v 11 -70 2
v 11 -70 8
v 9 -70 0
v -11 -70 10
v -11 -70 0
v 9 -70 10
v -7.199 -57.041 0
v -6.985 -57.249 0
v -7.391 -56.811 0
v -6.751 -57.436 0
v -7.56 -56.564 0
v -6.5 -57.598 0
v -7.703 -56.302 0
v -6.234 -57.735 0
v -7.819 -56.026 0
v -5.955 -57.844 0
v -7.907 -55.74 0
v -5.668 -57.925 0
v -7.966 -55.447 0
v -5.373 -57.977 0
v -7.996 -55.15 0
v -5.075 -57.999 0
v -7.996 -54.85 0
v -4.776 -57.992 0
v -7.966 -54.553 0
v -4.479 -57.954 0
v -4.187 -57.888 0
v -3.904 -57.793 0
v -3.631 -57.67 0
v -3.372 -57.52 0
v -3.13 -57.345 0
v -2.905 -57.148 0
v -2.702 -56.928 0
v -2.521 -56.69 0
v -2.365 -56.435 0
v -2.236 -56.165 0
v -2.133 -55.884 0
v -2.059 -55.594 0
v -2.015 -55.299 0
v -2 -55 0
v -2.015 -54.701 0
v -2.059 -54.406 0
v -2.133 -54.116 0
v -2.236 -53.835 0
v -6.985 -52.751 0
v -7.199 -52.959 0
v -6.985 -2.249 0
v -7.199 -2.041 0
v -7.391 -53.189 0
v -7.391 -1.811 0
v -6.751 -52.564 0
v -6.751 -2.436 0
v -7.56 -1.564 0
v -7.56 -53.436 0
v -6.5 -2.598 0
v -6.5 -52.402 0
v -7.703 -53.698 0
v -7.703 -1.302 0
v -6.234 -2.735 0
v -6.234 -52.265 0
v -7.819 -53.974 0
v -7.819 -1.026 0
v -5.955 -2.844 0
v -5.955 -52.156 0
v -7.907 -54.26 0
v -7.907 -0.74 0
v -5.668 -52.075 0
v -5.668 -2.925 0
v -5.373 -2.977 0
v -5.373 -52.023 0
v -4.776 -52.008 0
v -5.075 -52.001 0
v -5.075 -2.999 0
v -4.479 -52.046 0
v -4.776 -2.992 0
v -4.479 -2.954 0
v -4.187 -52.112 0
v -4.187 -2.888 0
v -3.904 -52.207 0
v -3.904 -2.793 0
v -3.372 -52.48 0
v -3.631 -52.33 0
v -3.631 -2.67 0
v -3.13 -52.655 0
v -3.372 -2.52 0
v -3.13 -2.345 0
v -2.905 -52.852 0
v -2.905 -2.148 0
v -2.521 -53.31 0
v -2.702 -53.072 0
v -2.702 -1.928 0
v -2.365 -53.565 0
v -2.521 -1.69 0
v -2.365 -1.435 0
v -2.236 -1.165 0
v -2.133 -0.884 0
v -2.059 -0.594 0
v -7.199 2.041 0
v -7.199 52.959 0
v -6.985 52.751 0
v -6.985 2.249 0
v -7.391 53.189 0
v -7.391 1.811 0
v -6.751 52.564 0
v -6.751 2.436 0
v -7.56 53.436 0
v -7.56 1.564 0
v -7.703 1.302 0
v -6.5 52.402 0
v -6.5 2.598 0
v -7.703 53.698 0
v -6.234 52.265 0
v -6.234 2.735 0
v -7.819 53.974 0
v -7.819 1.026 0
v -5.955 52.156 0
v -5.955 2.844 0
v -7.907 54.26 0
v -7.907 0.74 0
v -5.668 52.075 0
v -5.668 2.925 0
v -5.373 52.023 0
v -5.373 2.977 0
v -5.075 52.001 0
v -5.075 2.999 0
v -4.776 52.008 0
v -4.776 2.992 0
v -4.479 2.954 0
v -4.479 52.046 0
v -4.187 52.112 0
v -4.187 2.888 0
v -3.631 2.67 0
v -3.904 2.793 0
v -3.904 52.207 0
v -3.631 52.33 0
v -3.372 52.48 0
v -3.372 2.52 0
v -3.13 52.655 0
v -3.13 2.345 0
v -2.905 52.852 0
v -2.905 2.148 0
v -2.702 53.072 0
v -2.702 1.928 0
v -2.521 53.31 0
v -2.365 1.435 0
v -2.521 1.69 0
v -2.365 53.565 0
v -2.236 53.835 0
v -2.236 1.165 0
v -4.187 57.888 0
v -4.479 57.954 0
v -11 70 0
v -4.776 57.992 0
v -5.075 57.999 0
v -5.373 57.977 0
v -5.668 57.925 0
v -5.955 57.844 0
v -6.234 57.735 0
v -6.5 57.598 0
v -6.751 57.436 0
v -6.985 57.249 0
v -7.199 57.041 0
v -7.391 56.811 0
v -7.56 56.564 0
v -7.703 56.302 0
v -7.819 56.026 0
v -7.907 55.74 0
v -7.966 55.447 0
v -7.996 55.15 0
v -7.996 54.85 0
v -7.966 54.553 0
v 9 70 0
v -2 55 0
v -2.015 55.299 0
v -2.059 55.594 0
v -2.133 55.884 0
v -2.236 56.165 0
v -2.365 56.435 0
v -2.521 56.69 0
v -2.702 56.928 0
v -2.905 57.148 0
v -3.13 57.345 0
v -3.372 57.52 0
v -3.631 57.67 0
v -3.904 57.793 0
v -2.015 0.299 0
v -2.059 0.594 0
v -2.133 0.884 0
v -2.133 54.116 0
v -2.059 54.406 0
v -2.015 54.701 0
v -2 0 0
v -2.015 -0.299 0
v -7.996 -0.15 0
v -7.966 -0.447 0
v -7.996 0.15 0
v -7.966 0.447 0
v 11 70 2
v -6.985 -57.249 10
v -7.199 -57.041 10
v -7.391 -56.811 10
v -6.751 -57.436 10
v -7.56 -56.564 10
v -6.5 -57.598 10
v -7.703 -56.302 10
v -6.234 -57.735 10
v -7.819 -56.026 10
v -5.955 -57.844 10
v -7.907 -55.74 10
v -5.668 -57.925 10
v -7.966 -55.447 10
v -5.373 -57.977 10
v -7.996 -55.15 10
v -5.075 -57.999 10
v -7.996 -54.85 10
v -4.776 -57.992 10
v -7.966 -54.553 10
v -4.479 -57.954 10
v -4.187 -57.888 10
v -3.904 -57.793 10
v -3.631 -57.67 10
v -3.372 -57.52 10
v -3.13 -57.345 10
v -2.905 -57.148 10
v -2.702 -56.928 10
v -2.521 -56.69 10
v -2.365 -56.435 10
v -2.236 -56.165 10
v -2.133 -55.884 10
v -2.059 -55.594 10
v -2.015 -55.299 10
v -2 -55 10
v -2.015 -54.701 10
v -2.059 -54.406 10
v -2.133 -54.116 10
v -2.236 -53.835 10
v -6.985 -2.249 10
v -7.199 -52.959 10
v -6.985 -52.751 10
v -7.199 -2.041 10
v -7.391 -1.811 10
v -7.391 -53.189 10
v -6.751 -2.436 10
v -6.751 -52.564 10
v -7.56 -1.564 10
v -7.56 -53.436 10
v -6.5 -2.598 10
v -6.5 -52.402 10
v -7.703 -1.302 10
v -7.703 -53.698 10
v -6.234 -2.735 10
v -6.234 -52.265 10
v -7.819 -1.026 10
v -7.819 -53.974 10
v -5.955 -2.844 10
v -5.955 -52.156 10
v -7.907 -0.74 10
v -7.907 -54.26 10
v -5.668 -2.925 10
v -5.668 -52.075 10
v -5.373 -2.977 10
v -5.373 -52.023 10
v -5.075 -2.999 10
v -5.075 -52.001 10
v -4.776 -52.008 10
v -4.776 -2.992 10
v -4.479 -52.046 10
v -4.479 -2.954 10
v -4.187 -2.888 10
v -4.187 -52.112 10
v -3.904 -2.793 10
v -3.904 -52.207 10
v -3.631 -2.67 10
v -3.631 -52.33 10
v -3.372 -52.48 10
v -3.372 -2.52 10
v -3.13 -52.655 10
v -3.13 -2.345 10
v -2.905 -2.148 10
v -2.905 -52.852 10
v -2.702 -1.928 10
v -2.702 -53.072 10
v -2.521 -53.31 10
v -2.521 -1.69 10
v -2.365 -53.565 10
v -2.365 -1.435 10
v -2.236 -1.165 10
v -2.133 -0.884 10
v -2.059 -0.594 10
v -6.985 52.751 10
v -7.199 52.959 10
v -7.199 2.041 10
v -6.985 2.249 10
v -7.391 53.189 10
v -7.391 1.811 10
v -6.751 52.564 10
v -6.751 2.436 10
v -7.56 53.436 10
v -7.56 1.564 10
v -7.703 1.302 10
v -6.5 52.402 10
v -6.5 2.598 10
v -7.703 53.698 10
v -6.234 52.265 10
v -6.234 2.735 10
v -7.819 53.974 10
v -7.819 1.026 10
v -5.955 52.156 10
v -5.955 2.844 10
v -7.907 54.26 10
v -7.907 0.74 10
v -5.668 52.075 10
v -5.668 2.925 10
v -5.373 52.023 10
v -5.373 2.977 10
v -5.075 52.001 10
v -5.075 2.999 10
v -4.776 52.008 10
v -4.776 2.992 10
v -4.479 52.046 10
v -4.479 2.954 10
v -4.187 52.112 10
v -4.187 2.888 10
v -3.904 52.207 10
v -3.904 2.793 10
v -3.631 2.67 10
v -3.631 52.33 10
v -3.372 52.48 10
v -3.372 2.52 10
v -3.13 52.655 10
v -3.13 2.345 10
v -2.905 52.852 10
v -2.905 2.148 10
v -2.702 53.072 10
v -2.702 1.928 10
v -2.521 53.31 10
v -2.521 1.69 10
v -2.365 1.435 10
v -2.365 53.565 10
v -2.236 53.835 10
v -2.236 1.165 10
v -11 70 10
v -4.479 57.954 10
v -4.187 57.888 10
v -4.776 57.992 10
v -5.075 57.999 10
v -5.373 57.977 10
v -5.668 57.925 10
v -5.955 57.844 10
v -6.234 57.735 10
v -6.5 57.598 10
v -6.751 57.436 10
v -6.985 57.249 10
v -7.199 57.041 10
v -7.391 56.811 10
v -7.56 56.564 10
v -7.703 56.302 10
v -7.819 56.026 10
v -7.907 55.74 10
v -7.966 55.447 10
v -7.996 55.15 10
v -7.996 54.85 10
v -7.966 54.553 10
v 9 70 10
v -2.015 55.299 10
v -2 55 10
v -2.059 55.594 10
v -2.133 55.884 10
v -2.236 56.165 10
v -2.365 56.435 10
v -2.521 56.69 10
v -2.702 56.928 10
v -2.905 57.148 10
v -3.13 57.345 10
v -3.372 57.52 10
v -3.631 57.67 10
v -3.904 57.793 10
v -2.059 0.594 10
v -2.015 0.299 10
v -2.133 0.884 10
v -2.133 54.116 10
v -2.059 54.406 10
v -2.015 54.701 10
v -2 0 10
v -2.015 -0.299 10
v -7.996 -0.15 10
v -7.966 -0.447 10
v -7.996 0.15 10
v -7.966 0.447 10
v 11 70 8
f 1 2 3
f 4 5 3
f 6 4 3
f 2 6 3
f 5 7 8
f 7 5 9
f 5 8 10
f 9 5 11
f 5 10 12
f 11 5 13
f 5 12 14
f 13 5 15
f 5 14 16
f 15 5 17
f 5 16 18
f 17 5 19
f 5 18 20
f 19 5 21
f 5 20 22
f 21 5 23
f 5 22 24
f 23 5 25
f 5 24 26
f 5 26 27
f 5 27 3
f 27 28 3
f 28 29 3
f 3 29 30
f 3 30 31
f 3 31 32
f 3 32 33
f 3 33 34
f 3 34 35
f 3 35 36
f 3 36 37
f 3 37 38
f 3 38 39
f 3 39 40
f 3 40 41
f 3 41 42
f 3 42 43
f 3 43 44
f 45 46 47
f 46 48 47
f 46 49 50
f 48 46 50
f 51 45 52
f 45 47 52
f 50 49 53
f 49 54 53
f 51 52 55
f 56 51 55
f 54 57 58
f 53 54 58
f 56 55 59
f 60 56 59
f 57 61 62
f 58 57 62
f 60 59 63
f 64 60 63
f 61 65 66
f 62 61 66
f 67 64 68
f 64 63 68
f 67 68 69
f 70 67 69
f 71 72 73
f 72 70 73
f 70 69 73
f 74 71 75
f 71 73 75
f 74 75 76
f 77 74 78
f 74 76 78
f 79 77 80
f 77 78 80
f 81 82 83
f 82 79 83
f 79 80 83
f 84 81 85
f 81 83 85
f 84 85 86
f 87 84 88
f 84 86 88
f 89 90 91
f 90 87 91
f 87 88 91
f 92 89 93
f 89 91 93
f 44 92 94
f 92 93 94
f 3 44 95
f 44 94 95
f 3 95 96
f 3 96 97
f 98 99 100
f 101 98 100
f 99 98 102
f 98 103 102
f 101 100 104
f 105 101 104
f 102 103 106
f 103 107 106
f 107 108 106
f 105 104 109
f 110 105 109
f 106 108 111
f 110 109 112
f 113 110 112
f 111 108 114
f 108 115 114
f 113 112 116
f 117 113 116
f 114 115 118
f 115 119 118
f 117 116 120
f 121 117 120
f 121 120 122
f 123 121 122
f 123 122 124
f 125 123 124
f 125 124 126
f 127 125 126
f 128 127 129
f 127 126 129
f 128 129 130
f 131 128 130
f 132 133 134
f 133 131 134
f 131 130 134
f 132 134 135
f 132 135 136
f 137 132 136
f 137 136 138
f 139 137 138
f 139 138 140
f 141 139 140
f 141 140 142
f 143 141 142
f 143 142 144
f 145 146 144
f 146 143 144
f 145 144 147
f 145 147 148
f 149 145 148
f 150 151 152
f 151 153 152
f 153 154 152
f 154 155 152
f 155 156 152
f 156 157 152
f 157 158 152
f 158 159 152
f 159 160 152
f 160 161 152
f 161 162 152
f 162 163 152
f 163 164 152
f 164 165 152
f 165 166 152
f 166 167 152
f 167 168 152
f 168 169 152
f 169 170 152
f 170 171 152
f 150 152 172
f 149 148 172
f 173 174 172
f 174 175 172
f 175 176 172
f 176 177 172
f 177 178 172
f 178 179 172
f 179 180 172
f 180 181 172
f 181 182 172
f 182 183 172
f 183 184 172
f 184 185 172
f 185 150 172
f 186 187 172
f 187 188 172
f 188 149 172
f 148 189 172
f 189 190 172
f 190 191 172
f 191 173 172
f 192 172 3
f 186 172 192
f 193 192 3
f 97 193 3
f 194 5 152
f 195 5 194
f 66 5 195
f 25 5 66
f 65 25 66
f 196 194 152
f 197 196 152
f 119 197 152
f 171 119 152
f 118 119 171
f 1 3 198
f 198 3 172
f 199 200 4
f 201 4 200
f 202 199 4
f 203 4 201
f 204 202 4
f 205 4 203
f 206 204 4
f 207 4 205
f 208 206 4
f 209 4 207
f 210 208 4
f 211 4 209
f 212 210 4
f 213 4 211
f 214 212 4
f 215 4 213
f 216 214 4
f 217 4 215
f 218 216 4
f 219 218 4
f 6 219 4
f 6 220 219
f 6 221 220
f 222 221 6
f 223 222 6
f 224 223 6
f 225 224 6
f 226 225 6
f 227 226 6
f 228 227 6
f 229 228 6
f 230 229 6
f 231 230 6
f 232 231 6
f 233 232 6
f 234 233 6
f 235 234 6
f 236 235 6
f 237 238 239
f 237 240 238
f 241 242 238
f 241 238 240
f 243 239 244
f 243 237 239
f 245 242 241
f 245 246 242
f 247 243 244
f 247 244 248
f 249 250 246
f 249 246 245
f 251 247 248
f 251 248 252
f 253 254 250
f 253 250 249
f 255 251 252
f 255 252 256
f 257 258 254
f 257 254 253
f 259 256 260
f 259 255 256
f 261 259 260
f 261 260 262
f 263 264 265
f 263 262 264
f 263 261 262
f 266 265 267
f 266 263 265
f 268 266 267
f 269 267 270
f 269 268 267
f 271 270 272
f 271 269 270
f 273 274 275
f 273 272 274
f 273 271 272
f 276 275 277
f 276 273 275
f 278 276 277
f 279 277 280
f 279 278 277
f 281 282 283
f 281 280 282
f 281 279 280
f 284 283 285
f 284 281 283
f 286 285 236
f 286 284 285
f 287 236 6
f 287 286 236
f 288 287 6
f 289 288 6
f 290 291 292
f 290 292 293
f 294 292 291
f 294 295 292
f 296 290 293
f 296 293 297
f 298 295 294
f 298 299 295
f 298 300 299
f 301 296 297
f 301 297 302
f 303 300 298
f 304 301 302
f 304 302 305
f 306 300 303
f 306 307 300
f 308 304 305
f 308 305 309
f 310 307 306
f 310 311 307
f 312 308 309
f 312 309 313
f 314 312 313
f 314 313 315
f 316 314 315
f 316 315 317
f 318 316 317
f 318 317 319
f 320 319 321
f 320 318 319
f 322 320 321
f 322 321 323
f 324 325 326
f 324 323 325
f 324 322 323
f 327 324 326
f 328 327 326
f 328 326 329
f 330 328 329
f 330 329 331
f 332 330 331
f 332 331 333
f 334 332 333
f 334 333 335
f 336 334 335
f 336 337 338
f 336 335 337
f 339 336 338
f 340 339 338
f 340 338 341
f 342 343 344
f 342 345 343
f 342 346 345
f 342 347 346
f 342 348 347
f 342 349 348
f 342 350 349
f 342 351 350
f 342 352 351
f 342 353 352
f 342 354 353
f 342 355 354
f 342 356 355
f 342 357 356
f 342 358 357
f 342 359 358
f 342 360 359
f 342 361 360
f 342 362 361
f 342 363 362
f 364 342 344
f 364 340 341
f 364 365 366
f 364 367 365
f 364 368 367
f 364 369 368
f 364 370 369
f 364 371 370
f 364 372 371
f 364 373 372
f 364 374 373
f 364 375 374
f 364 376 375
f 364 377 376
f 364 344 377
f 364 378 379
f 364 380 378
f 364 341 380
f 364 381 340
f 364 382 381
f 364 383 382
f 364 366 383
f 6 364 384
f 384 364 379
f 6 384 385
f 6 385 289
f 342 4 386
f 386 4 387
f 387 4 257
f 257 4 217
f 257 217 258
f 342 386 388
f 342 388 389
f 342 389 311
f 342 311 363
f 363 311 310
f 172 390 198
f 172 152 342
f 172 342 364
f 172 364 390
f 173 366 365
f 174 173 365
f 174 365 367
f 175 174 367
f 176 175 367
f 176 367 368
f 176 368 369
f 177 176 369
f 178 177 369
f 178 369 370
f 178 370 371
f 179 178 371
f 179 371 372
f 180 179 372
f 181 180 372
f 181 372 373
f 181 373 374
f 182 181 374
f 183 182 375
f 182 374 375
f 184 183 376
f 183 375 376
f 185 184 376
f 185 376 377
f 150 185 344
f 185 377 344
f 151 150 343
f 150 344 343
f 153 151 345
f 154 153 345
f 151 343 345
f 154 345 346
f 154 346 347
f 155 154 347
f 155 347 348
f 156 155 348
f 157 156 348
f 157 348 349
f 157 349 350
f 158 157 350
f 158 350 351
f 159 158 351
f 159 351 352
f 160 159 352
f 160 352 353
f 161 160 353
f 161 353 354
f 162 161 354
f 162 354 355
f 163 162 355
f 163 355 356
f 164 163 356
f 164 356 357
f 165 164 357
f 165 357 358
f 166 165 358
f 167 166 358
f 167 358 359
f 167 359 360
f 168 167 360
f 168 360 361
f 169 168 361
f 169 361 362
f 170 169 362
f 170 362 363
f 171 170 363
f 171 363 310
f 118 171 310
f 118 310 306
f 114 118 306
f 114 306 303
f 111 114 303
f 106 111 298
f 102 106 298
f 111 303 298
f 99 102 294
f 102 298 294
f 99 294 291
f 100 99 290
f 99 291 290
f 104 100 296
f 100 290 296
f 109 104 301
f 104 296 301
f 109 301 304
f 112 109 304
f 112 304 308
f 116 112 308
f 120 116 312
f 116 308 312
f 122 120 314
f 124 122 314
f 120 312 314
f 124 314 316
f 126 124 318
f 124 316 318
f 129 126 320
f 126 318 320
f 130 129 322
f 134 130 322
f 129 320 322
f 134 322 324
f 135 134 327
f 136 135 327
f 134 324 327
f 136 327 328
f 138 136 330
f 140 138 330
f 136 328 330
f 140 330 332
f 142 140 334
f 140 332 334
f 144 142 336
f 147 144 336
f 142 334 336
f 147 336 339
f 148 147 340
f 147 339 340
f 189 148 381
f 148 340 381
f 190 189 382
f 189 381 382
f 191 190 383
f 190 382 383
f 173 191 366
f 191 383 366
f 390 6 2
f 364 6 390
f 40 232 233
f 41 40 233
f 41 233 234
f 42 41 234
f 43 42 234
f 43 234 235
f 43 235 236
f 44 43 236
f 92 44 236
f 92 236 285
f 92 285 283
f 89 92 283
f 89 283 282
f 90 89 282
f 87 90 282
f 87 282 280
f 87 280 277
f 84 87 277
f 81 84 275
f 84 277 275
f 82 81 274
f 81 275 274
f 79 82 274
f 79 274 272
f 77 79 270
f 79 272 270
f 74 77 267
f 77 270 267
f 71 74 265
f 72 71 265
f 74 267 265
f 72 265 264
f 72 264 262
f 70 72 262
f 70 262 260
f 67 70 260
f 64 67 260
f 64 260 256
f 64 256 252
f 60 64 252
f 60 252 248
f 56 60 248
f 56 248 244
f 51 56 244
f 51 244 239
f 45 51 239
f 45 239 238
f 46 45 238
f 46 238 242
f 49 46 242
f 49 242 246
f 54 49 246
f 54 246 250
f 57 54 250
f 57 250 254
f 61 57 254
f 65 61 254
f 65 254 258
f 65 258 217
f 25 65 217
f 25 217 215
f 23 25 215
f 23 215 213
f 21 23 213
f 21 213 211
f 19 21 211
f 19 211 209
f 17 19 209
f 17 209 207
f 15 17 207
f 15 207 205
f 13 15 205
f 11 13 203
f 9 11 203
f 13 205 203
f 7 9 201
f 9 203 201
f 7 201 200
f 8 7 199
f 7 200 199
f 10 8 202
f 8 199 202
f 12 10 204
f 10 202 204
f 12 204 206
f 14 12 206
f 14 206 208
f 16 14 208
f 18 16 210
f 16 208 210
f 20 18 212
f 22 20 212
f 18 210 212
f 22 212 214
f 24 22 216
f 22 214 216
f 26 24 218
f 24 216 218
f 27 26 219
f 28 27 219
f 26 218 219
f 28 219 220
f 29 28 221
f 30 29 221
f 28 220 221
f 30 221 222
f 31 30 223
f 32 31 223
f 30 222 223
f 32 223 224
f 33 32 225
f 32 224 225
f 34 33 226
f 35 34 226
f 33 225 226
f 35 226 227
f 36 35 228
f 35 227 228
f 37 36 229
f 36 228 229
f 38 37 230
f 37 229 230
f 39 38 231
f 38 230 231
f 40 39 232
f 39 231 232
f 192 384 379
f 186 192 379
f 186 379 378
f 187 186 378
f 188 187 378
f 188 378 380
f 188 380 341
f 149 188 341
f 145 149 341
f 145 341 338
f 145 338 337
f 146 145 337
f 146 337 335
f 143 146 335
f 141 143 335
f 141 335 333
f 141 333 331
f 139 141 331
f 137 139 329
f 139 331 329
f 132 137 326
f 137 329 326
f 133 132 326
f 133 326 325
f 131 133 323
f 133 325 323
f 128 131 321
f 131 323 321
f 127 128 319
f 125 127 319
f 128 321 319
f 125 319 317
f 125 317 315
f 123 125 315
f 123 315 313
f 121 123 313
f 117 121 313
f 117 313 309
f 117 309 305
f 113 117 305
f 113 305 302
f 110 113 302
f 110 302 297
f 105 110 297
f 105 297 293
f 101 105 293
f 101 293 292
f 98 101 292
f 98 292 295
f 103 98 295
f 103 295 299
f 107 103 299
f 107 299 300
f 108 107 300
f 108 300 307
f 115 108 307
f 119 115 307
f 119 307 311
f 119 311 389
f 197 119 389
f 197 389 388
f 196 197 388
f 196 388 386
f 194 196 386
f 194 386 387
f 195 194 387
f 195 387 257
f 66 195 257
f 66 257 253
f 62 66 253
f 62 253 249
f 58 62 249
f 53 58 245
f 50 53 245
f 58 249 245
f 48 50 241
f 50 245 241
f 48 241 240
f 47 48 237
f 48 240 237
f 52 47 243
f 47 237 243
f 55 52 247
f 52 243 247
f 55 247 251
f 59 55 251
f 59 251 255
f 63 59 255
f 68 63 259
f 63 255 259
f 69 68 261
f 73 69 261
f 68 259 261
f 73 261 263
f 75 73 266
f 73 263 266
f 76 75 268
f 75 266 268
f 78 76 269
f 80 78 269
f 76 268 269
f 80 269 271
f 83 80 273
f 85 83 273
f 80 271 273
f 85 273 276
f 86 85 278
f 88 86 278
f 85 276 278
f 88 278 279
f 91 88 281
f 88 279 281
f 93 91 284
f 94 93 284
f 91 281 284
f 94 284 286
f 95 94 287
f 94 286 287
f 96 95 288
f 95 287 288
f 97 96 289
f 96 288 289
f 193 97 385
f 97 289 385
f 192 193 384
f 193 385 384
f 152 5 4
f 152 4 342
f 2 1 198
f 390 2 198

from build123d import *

# Parameters (mm, degrees)
SKETCH1_W           = 22
SKETCH1_H           = 140
BOSS_EXTRUDE1_DEPTH = 10
CHAMFER1_SIZE       = 2
SKETCH2_R           = 3
CUT_EXTRUDE1_DEPTH  = 11


with BuildPart() as part:
    # Sketch1 → Boss-Extrude1 (new body)
    with BuildSketch(Plane.XY):
        Rectangle(SKETCH1_W, SKETCH1_H)
    extrude(amount=BOSS_EXTRUDE1_DEPTH)

    # Chamfer1
    chamfer1_edges = [part.edges().sort_by_distance(p)[0] for p in [
        (11, 0, 0),
        (11, 0, 10),
    ]]
    chamfer(chamfer1_edges, length=CHAMFER1_SIZE)

    # Sketch2 → Cut-Extrude1 (cut, through all)
    with BuildSketch(Plane.XY.offset(10)):
        with Locations((-5, 55)):
            Circle(SKETCH2_R)
        with Locations((-5, 0)):
            Circle(SKETCH2_R)
        with Locations((-5, -55)):
            Circle(SKETCH2_R)
    extrude(amount=-CUT_EXTRUDE1_DEPTH, mode=Mode.SUBTRACT)


solid = part.part
